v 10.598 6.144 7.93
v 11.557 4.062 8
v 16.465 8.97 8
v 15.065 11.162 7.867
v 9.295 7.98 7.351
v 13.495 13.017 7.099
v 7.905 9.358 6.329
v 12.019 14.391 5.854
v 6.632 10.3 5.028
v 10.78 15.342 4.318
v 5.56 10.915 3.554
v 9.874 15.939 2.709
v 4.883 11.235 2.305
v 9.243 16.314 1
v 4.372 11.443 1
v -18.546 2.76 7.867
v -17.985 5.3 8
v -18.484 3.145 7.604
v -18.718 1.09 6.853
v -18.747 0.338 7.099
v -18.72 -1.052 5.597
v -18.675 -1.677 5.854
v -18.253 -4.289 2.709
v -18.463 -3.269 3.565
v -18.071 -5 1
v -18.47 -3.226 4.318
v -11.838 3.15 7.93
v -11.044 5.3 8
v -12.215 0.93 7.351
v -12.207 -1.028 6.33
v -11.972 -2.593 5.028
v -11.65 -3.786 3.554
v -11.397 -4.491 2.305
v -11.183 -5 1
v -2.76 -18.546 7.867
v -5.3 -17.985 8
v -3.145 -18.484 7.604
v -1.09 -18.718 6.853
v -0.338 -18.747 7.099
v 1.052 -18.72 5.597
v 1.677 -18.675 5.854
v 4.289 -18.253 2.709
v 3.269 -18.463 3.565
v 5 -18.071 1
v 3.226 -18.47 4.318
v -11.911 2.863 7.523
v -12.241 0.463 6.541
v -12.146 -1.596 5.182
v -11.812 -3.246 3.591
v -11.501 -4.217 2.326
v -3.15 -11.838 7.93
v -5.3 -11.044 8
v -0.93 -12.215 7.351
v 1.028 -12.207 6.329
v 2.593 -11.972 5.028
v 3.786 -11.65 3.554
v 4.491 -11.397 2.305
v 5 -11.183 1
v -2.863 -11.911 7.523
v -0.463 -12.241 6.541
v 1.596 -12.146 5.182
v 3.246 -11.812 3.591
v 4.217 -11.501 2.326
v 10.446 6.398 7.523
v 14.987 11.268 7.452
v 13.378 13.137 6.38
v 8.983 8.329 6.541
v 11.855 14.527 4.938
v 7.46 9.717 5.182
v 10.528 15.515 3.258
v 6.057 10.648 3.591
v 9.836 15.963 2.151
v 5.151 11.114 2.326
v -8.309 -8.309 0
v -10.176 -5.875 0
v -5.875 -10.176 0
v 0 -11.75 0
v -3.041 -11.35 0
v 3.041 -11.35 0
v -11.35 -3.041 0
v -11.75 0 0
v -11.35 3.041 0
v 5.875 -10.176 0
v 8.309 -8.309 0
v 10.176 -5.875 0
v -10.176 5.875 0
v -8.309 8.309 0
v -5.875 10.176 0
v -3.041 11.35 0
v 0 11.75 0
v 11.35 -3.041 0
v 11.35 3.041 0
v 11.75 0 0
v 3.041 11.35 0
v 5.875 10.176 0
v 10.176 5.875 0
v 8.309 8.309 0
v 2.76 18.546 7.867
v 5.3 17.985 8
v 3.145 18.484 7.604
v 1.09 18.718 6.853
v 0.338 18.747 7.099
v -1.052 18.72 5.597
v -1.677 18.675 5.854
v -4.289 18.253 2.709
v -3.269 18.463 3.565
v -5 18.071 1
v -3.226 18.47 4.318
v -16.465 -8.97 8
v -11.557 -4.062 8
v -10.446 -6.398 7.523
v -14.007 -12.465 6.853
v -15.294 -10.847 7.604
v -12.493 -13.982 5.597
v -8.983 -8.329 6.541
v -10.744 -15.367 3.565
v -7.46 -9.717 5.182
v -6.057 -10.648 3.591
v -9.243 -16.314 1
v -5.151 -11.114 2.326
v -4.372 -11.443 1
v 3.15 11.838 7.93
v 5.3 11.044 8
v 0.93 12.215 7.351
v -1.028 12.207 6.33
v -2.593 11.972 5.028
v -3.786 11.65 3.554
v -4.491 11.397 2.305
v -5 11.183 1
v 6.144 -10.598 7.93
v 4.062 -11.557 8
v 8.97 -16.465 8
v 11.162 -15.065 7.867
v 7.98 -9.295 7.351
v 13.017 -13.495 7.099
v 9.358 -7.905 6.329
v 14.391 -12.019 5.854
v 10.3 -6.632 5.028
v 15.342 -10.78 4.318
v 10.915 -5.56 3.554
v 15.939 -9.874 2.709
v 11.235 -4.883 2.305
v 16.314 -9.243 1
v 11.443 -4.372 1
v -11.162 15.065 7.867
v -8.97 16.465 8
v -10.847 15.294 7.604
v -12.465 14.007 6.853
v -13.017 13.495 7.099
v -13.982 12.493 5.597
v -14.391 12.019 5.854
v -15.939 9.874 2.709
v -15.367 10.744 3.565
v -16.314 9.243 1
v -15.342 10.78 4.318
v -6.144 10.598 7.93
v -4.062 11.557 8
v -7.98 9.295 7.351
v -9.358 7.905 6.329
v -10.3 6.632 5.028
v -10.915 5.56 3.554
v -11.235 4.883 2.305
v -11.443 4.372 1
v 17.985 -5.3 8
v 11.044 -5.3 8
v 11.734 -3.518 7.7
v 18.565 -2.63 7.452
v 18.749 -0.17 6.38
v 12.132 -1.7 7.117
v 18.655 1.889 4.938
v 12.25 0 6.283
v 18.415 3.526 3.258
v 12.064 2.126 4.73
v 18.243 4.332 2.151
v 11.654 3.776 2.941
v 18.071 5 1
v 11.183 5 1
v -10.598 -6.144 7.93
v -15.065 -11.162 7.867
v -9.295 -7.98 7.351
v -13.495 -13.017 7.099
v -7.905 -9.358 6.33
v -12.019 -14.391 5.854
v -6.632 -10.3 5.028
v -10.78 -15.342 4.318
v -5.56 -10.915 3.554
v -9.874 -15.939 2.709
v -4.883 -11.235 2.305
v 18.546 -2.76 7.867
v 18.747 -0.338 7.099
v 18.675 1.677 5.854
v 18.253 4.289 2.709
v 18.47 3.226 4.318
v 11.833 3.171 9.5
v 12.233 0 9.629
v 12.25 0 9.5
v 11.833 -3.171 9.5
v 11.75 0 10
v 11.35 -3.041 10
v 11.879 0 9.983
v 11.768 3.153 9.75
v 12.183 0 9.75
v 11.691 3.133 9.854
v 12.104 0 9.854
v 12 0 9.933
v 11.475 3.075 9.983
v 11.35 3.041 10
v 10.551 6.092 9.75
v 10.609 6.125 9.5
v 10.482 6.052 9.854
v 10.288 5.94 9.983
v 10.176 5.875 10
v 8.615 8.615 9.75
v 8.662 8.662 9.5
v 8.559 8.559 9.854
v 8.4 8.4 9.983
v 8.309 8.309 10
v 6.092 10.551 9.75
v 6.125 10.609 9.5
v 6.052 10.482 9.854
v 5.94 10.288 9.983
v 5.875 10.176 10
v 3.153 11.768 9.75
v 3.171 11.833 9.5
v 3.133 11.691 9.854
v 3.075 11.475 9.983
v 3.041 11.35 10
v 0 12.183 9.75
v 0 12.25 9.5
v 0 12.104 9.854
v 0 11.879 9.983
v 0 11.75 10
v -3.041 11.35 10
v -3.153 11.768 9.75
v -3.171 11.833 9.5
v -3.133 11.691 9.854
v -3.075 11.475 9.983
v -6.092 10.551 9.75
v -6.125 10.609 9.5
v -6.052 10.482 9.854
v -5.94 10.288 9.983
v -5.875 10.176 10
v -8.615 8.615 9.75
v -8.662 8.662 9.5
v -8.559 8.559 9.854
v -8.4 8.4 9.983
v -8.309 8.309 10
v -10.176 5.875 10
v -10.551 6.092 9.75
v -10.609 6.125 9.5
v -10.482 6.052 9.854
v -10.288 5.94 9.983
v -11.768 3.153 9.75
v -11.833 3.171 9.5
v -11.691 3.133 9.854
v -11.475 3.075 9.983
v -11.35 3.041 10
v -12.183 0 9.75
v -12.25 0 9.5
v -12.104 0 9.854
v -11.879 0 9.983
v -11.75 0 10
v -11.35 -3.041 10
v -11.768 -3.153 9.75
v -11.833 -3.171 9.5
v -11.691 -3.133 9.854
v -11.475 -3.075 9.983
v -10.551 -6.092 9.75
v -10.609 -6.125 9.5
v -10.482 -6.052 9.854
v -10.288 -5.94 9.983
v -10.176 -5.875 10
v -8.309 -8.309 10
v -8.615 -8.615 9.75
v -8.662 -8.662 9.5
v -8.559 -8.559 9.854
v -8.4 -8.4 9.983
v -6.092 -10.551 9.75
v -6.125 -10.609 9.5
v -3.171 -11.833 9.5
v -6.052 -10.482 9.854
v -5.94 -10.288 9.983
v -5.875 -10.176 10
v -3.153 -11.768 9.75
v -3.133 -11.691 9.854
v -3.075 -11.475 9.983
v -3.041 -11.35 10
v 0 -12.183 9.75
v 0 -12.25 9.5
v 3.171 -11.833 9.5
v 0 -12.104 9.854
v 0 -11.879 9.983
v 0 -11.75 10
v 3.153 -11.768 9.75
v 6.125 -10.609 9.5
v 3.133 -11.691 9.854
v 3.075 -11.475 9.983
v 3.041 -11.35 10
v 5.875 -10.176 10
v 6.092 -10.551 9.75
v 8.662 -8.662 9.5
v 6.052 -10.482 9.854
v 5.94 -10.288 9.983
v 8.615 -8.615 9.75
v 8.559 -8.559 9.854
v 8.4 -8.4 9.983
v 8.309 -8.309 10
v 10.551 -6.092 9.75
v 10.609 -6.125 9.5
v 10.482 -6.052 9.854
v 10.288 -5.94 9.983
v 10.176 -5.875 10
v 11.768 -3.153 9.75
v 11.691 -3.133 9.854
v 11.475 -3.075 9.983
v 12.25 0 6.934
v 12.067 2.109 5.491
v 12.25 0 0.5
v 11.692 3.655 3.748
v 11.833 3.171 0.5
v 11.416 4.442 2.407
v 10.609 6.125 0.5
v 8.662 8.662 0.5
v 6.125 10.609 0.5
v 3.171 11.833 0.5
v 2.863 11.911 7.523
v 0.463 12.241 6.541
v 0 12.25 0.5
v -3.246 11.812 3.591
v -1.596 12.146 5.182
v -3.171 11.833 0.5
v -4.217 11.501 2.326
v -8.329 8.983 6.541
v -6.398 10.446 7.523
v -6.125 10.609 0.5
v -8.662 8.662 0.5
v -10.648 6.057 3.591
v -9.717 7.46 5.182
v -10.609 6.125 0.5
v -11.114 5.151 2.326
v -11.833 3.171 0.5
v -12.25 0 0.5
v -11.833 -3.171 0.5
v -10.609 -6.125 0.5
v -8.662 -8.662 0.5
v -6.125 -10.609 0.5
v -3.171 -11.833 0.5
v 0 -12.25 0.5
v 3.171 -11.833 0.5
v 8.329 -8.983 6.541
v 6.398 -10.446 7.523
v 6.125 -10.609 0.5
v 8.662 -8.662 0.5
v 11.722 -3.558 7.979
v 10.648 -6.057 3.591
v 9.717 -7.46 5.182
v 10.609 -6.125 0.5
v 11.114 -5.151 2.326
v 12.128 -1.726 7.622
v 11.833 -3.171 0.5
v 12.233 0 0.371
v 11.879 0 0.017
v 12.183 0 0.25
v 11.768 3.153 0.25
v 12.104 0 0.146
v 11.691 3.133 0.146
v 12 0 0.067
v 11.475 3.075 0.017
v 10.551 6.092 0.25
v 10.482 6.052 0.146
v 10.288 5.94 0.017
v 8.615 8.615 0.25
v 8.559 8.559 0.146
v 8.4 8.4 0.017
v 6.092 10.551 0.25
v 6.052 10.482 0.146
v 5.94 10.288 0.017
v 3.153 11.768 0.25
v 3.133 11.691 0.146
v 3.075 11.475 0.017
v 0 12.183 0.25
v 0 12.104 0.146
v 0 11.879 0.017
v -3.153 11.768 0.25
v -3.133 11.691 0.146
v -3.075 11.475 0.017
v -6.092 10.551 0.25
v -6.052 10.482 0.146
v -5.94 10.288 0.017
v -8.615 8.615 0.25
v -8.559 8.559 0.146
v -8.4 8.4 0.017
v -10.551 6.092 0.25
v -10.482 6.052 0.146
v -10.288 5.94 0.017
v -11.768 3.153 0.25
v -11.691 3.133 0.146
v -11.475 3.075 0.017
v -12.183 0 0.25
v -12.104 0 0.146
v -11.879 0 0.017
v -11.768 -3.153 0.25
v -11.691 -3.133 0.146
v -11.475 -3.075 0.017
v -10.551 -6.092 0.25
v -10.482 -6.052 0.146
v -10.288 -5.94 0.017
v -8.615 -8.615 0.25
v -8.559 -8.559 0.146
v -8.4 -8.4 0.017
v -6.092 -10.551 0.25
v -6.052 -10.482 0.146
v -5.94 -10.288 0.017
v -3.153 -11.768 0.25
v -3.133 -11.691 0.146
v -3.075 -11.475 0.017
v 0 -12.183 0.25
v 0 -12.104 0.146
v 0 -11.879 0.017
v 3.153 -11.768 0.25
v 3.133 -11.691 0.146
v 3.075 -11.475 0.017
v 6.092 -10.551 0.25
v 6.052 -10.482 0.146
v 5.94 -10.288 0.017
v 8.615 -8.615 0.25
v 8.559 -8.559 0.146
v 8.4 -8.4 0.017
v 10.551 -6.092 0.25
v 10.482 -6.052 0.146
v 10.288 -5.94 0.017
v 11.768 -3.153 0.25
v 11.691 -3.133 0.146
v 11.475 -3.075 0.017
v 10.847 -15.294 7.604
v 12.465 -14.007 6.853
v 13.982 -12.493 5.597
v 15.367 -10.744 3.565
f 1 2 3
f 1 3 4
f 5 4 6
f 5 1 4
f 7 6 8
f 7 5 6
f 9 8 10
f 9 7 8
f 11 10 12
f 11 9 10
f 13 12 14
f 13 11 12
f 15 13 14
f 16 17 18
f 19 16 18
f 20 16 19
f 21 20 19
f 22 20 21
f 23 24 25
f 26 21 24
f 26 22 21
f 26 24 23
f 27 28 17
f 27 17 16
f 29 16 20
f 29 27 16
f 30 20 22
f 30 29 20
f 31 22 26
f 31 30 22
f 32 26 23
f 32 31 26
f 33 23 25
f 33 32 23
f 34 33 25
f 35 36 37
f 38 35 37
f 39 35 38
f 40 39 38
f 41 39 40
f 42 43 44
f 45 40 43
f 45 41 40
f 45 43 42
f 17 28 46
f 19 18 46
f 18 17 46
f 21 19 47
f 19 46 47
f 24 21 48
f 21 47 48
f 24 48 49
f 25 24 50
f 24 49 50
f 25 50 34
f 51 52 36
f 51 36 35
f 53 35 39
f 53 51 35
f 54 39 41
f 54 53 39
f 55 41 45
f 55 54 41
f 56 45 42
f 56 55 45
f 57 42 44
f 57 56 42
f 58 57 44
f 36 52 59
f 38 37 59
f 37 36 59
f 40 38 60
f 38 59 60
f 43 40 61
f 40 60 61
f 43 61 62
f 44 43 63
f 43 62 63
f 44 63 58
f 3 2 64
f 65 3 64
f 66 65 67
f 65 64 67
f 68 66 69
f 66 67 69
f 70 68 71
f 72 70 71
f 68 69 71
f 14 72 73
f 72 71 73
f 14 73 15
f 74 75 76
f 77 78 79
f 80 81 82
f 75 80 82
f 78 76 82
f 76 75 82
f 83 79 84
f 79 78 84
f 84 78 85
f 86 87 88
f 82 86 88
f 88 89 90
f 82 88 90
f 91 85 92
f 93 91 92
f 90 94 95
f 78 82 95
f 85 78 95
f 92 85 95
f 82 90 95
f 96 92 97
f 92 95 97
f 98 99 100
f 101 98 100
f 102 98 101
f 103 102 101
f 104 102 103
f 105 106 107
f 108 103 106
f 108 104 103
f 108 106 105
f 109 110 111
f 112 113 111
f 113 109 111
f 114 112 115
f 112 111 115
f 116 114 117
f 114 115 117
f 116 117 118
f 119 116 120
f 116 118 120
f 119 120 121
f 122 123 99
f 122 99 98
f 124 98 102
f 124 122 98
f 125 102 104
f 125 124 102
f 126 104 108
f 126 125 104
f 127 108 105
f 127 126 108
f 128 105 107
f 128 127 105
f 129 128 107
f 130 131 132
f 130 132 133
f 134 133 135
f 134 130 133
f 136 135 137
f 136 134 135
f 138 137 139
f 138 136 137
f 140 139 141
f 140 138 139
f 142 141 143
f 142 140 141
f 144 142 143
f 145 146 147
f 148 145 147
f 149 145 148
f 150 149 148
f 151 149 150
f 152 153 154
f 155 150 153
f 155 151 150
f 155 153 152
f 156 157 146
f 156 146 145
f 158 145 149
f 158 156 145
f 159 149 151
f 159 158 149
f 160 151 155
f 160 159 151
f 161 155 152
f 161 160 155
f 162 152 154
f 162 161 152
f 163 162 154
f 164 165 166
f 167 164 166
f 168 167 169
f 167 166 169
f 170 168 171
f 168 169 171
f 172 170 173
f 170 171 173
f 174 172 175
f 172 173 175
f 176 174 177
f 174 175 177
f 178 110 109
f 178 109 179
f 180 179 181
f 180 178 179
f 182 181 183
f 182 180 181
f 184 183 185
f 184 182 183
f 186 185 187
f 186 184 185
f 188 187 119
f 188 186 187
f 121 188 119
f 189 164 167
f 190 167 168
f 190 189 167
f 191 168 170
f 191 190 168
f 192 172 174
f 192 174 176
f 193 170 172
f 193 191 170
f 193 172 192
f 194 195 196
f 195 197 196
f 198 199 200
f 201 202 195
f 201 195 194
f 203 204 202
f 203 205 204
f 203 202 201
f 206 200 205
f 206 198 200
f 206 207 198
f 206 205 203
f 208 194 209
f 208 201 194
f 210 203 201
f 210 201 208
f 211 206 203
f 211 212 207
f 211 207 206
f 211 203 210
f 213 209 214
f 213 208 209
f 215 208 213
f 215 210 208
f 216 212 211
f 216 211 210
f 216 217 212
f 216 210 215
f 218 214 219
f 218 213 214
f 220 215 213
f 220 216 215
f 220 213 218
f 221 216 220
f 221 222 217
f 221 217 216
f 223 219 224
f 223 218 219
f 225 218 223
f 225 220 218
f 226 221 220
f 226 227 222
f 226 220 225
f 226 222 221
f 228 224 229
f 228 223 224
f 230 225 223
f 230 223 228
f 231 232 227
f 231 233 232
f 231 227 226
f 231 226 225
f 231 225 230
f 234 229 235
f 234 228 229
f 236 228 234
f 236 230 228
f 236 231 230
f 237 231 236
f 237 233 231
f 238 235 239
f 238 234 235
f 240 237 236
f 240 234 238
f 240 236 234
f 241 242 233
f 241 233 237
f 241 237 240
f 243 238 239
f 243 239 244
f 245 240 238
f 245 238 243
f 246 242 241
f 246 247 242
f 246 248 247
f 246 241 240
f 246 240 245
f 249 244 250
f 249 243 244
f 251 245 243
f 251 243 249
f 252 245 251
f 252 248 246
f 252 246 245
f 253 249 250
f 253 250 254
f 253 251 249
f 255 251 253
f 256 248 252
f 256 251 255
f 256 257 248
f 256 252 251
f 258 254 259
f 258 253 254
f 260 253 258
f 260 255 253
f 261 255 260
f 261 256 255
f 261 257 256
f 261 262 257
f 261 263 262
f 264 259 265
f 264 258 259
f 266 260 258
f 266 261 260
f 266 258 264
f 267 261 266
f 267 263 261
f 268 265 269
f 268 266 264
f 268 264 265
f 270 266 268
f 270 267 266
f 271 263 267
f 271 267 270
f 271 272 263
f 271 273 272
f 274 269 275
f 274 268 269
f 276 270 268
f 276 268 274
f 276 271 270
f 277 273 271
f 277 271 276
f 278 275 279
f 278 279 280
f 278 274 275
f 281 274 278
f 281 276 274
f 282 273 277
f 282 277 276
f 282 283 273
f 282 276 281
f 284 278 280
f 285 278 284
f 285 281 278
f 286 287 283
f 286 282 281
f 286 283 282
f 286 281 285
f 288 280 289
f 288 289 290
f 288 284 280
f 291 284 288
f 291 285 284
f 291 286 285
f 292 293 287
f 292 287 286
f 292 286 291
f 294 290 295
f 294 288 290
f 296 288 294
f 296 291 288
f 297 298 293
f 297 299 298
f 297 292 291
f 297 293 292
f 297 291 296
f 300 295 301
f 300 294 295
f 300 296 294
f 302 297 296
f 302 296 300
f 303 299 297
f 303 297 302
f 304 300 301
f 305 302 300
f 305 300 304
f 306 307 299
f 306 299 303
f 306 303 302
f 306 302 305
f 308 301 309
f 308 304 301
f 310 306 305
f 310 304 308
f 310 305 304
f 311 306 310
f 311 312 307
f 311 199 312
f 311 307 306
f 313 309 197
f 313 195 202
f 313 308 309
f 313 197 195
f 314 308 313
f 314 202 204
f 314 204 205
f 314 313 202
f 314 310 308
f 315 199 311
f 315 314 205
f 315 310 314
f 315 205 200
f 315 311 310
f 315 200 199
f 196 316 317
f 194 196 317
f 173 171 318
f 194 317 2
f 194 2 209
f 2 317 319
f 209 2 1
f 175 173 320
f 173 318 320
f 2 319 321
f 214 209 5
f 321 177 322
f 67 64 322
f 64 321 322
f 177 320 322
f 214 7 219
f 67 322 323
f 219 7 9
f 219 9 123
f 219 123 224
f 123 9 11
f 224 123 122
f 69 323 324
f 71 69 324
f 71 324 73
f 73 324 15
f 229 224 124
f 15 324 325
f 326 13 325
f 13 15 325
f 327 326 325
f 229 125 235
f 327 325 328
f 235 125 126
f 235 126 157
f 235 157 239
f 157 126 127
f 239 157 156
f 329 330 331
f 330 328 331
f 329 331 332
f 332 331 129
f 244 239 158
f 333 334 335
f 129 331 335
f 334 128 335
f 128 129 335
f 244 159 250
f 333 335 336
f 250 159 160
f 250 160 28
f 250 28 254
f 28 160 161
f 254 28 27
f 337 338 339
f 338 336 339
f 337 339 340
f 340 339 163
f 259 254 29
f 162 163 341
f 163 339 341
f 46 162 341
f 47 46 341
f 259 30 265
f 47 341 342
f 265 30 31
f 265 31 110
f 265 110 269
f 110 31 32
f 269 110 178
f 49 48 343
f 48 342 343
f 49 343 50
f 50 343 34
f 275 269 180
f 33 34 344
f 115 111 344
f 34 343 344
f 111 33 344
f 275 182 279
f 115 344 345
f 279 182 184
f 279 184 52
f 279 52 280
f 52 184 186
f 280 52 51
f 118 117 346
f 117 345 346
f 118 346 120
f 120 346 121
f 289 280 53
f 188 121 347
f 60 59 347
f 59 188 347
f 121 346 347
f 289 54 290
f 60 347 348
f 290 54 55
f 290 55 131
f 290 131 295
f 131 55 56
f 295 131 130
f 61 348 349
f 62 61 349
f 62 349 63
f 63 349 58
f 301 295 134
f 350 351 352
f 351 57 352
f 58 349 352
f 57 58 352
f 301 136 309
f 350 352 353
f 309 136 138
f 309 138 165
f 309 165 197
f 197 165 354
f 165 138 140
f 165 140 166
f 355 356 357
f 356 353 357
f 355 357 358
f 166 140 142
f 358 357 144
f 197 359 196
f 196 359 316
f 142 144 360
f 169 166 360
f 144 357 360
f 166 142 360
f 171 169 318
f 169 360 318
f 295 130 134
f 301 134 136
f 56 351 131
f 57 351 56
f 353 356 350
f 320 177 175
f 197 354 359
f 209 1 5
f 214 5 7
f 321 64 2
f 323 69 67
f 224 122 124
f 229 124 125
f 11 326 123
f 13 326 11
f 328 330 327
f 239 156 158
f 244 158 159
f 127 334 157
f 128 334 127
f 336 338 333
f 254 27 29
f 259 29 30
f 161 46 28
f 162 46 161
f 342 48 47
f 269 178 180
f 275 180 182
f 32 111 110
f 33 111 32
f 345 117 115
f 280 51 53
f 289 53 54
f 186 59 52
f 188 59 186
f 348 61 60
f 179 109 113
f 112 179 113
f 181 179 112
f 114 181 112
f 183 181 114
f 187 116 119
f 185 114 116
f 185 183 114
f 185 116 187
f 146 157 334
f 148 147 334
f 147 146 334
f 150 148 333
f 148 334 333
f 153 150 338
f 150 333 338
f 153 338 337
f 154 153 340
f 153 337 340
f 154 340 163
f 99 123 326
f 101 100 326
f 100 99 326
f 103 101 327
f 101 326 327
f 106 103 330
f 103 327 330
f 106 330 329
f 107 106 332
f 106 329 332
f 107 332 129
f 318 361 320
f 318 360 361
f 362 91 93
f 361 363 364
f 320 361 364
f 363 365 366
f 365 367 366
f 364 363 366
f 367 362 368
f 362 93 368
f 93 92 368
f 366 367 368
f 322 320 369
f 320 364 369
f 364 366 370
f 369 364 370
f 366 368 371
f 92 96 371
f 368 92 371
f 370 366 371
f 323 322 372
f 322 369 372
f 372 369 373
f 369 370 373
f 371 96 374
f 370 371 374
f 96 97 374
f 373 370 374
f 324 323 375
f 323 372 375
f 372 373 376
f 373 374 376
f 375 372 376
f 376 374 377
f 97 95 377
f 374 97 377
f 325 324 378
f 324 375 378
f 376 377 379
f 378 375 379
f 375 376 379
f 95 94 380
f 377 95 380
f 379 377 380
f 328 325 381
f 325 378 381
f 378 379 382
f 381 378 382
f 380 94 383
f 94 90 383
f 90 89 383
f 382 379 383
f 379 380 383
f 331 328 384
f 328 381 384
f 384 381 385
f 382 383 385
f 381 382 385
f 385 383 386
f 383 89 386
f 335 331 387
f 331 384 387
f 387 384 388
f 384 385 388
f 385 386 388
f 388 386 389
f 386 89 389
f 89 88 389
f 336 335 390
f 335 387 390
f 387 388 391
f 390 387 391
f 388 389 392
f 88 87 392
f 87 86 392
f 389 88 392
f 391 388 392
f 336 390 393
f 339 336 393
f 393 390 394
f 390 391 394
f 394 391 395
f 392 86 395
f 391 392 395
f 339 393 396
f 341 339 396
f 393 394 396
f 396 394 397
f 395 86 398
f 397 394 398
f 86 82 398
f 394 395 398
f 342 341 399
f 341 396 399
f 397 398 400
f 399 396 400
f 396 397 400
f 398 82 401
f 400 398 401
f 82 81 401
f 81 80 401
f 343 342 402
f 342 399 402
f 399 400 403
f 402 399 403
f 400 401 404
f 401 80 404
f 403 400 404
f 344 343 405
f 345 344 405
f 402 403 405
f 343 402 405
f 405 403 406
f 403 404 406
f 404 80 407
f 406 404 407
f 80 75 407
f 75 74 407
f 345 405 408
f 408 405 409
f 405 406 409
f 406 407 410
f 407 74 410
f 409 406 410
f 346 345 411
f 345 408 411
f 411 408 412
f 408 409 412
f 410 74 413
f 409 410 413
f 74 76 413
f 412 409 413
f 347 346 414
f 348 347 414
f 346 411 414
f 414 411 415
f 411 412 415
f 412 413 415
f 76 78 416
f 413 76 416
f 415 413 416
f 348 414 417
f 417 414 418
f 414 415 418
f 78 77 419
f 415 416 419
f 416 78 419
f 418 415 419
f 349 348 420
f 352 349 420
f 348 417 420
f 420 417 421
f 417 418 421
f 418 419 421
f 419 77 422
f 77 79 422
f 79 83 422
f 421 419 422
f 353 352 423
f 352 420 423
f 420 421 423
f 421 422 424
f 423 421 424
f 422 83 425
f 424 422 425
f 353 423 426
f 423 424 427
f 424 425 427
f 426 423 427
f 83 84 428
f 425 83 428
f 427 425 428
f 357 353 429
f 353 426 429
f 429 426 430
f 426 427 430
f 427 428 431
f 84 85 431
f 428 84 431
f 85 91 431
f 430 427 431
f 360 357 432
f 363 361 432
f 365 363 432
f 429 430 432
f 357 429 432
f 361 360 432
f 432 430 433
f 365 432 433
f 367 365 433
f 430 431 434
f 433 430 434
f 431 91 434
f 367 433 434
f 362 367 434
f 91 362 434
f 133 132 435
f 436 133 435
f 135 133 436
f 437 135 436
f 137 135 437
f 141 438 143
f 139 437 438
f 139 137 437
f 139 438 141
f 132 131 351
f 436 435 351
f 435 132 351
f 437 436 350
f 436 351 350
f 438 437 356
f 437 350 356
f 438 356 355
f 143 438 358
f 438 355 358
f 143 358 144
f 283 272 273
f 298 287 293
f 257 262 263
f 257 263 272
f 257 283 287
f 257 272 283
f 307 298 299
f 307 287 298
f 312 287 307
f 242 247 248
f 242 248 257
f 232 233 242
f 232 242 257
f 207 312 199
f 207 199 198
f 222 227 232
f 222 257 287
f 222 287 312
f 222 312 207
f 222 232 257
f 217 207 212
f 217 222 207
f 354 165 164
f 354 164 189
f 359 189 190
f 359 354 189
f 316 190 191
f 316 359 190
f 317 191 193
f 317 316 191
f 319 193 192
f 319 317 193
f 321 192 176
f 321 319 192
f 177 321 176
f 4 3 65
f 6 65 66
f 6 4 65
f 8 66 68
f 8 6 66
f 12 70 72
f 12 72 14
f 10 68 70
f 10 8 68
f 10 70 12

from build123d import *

# Parameters (mm, degrees)
SKETCH072_R           = 12.25
PAD027_DEPTH          = 10
FILLET040_R           = 0.5
PAD030_DEPTH          = 7.5
SKETCH063_R           = 32.89
SKETCH063_R_2         = 18.75
POCKET020_DEPTH       = 94.210561
POLARPATTERN006_COUNT = 8


with BuildPart() as part:
    # Sketch072 → Pad027 (new body)
    with BuildSketch(Plane.XY):
        Circle(SKETCH072_R)
    extrude(amount=PAD027_DEPTH)

    # Fillet040
    fillet040_edges = [part.edges().sort_by_distance(p)[0] for p in [
        (-12.25, 0, 10),
        (-12.25, 0, 0),
    ]]
    fillet(fillet040_edges, radius=FILLET040_R)

    # Sketch085 (on DatumPlane) → Pad030 (join, symmetric)
    with BuildSketch(Plane(origin=(0, 13, -2), x_dir=(1, 0, 0), z_dir=(0, -1, 0))):
        with BuildLine():
            ThreePointArc((5.3, 10), (-1.072659, 8.299055), (-5, 3))
            ThreePointArc((5.3, 10), (-0.742753, 7.813623), (-5, 3))
        make_face()
    pad030 = extrude(amount=PAD030_DEPTH, both=True)

    # Sketch063 (on Face7 of Pad030) → Pocket020 (cut, through all)
    with BuildSketch(Plane.XY.offset(10)):
        Circle(SKETCH063_R)
        Circle(SKETCH063_R_2, mode=Mode.SUBTRACT)
    pocket020 = extrude(amount=-POCKET020_DEPTH, mode=Mode.SUBTRACT)

    # PolarPattern006: Pad030, Pocket020 ×8 about axis
    polarpattern006_axis = Axis((0, 0, 0), (0, 0, 1))
    for i in range(1, POLARPATTERN006_COUNT):
        add(pad030.rotate(polarpattern006_axis, i * 360 / POLARPATTERN006_COUNT))
        add(pocket020.rotate(polarpattern006_axis, i * 360 / POLARPATTERN006_COUNT), mode=Mode.SUBTRACT)


solid = part.part
